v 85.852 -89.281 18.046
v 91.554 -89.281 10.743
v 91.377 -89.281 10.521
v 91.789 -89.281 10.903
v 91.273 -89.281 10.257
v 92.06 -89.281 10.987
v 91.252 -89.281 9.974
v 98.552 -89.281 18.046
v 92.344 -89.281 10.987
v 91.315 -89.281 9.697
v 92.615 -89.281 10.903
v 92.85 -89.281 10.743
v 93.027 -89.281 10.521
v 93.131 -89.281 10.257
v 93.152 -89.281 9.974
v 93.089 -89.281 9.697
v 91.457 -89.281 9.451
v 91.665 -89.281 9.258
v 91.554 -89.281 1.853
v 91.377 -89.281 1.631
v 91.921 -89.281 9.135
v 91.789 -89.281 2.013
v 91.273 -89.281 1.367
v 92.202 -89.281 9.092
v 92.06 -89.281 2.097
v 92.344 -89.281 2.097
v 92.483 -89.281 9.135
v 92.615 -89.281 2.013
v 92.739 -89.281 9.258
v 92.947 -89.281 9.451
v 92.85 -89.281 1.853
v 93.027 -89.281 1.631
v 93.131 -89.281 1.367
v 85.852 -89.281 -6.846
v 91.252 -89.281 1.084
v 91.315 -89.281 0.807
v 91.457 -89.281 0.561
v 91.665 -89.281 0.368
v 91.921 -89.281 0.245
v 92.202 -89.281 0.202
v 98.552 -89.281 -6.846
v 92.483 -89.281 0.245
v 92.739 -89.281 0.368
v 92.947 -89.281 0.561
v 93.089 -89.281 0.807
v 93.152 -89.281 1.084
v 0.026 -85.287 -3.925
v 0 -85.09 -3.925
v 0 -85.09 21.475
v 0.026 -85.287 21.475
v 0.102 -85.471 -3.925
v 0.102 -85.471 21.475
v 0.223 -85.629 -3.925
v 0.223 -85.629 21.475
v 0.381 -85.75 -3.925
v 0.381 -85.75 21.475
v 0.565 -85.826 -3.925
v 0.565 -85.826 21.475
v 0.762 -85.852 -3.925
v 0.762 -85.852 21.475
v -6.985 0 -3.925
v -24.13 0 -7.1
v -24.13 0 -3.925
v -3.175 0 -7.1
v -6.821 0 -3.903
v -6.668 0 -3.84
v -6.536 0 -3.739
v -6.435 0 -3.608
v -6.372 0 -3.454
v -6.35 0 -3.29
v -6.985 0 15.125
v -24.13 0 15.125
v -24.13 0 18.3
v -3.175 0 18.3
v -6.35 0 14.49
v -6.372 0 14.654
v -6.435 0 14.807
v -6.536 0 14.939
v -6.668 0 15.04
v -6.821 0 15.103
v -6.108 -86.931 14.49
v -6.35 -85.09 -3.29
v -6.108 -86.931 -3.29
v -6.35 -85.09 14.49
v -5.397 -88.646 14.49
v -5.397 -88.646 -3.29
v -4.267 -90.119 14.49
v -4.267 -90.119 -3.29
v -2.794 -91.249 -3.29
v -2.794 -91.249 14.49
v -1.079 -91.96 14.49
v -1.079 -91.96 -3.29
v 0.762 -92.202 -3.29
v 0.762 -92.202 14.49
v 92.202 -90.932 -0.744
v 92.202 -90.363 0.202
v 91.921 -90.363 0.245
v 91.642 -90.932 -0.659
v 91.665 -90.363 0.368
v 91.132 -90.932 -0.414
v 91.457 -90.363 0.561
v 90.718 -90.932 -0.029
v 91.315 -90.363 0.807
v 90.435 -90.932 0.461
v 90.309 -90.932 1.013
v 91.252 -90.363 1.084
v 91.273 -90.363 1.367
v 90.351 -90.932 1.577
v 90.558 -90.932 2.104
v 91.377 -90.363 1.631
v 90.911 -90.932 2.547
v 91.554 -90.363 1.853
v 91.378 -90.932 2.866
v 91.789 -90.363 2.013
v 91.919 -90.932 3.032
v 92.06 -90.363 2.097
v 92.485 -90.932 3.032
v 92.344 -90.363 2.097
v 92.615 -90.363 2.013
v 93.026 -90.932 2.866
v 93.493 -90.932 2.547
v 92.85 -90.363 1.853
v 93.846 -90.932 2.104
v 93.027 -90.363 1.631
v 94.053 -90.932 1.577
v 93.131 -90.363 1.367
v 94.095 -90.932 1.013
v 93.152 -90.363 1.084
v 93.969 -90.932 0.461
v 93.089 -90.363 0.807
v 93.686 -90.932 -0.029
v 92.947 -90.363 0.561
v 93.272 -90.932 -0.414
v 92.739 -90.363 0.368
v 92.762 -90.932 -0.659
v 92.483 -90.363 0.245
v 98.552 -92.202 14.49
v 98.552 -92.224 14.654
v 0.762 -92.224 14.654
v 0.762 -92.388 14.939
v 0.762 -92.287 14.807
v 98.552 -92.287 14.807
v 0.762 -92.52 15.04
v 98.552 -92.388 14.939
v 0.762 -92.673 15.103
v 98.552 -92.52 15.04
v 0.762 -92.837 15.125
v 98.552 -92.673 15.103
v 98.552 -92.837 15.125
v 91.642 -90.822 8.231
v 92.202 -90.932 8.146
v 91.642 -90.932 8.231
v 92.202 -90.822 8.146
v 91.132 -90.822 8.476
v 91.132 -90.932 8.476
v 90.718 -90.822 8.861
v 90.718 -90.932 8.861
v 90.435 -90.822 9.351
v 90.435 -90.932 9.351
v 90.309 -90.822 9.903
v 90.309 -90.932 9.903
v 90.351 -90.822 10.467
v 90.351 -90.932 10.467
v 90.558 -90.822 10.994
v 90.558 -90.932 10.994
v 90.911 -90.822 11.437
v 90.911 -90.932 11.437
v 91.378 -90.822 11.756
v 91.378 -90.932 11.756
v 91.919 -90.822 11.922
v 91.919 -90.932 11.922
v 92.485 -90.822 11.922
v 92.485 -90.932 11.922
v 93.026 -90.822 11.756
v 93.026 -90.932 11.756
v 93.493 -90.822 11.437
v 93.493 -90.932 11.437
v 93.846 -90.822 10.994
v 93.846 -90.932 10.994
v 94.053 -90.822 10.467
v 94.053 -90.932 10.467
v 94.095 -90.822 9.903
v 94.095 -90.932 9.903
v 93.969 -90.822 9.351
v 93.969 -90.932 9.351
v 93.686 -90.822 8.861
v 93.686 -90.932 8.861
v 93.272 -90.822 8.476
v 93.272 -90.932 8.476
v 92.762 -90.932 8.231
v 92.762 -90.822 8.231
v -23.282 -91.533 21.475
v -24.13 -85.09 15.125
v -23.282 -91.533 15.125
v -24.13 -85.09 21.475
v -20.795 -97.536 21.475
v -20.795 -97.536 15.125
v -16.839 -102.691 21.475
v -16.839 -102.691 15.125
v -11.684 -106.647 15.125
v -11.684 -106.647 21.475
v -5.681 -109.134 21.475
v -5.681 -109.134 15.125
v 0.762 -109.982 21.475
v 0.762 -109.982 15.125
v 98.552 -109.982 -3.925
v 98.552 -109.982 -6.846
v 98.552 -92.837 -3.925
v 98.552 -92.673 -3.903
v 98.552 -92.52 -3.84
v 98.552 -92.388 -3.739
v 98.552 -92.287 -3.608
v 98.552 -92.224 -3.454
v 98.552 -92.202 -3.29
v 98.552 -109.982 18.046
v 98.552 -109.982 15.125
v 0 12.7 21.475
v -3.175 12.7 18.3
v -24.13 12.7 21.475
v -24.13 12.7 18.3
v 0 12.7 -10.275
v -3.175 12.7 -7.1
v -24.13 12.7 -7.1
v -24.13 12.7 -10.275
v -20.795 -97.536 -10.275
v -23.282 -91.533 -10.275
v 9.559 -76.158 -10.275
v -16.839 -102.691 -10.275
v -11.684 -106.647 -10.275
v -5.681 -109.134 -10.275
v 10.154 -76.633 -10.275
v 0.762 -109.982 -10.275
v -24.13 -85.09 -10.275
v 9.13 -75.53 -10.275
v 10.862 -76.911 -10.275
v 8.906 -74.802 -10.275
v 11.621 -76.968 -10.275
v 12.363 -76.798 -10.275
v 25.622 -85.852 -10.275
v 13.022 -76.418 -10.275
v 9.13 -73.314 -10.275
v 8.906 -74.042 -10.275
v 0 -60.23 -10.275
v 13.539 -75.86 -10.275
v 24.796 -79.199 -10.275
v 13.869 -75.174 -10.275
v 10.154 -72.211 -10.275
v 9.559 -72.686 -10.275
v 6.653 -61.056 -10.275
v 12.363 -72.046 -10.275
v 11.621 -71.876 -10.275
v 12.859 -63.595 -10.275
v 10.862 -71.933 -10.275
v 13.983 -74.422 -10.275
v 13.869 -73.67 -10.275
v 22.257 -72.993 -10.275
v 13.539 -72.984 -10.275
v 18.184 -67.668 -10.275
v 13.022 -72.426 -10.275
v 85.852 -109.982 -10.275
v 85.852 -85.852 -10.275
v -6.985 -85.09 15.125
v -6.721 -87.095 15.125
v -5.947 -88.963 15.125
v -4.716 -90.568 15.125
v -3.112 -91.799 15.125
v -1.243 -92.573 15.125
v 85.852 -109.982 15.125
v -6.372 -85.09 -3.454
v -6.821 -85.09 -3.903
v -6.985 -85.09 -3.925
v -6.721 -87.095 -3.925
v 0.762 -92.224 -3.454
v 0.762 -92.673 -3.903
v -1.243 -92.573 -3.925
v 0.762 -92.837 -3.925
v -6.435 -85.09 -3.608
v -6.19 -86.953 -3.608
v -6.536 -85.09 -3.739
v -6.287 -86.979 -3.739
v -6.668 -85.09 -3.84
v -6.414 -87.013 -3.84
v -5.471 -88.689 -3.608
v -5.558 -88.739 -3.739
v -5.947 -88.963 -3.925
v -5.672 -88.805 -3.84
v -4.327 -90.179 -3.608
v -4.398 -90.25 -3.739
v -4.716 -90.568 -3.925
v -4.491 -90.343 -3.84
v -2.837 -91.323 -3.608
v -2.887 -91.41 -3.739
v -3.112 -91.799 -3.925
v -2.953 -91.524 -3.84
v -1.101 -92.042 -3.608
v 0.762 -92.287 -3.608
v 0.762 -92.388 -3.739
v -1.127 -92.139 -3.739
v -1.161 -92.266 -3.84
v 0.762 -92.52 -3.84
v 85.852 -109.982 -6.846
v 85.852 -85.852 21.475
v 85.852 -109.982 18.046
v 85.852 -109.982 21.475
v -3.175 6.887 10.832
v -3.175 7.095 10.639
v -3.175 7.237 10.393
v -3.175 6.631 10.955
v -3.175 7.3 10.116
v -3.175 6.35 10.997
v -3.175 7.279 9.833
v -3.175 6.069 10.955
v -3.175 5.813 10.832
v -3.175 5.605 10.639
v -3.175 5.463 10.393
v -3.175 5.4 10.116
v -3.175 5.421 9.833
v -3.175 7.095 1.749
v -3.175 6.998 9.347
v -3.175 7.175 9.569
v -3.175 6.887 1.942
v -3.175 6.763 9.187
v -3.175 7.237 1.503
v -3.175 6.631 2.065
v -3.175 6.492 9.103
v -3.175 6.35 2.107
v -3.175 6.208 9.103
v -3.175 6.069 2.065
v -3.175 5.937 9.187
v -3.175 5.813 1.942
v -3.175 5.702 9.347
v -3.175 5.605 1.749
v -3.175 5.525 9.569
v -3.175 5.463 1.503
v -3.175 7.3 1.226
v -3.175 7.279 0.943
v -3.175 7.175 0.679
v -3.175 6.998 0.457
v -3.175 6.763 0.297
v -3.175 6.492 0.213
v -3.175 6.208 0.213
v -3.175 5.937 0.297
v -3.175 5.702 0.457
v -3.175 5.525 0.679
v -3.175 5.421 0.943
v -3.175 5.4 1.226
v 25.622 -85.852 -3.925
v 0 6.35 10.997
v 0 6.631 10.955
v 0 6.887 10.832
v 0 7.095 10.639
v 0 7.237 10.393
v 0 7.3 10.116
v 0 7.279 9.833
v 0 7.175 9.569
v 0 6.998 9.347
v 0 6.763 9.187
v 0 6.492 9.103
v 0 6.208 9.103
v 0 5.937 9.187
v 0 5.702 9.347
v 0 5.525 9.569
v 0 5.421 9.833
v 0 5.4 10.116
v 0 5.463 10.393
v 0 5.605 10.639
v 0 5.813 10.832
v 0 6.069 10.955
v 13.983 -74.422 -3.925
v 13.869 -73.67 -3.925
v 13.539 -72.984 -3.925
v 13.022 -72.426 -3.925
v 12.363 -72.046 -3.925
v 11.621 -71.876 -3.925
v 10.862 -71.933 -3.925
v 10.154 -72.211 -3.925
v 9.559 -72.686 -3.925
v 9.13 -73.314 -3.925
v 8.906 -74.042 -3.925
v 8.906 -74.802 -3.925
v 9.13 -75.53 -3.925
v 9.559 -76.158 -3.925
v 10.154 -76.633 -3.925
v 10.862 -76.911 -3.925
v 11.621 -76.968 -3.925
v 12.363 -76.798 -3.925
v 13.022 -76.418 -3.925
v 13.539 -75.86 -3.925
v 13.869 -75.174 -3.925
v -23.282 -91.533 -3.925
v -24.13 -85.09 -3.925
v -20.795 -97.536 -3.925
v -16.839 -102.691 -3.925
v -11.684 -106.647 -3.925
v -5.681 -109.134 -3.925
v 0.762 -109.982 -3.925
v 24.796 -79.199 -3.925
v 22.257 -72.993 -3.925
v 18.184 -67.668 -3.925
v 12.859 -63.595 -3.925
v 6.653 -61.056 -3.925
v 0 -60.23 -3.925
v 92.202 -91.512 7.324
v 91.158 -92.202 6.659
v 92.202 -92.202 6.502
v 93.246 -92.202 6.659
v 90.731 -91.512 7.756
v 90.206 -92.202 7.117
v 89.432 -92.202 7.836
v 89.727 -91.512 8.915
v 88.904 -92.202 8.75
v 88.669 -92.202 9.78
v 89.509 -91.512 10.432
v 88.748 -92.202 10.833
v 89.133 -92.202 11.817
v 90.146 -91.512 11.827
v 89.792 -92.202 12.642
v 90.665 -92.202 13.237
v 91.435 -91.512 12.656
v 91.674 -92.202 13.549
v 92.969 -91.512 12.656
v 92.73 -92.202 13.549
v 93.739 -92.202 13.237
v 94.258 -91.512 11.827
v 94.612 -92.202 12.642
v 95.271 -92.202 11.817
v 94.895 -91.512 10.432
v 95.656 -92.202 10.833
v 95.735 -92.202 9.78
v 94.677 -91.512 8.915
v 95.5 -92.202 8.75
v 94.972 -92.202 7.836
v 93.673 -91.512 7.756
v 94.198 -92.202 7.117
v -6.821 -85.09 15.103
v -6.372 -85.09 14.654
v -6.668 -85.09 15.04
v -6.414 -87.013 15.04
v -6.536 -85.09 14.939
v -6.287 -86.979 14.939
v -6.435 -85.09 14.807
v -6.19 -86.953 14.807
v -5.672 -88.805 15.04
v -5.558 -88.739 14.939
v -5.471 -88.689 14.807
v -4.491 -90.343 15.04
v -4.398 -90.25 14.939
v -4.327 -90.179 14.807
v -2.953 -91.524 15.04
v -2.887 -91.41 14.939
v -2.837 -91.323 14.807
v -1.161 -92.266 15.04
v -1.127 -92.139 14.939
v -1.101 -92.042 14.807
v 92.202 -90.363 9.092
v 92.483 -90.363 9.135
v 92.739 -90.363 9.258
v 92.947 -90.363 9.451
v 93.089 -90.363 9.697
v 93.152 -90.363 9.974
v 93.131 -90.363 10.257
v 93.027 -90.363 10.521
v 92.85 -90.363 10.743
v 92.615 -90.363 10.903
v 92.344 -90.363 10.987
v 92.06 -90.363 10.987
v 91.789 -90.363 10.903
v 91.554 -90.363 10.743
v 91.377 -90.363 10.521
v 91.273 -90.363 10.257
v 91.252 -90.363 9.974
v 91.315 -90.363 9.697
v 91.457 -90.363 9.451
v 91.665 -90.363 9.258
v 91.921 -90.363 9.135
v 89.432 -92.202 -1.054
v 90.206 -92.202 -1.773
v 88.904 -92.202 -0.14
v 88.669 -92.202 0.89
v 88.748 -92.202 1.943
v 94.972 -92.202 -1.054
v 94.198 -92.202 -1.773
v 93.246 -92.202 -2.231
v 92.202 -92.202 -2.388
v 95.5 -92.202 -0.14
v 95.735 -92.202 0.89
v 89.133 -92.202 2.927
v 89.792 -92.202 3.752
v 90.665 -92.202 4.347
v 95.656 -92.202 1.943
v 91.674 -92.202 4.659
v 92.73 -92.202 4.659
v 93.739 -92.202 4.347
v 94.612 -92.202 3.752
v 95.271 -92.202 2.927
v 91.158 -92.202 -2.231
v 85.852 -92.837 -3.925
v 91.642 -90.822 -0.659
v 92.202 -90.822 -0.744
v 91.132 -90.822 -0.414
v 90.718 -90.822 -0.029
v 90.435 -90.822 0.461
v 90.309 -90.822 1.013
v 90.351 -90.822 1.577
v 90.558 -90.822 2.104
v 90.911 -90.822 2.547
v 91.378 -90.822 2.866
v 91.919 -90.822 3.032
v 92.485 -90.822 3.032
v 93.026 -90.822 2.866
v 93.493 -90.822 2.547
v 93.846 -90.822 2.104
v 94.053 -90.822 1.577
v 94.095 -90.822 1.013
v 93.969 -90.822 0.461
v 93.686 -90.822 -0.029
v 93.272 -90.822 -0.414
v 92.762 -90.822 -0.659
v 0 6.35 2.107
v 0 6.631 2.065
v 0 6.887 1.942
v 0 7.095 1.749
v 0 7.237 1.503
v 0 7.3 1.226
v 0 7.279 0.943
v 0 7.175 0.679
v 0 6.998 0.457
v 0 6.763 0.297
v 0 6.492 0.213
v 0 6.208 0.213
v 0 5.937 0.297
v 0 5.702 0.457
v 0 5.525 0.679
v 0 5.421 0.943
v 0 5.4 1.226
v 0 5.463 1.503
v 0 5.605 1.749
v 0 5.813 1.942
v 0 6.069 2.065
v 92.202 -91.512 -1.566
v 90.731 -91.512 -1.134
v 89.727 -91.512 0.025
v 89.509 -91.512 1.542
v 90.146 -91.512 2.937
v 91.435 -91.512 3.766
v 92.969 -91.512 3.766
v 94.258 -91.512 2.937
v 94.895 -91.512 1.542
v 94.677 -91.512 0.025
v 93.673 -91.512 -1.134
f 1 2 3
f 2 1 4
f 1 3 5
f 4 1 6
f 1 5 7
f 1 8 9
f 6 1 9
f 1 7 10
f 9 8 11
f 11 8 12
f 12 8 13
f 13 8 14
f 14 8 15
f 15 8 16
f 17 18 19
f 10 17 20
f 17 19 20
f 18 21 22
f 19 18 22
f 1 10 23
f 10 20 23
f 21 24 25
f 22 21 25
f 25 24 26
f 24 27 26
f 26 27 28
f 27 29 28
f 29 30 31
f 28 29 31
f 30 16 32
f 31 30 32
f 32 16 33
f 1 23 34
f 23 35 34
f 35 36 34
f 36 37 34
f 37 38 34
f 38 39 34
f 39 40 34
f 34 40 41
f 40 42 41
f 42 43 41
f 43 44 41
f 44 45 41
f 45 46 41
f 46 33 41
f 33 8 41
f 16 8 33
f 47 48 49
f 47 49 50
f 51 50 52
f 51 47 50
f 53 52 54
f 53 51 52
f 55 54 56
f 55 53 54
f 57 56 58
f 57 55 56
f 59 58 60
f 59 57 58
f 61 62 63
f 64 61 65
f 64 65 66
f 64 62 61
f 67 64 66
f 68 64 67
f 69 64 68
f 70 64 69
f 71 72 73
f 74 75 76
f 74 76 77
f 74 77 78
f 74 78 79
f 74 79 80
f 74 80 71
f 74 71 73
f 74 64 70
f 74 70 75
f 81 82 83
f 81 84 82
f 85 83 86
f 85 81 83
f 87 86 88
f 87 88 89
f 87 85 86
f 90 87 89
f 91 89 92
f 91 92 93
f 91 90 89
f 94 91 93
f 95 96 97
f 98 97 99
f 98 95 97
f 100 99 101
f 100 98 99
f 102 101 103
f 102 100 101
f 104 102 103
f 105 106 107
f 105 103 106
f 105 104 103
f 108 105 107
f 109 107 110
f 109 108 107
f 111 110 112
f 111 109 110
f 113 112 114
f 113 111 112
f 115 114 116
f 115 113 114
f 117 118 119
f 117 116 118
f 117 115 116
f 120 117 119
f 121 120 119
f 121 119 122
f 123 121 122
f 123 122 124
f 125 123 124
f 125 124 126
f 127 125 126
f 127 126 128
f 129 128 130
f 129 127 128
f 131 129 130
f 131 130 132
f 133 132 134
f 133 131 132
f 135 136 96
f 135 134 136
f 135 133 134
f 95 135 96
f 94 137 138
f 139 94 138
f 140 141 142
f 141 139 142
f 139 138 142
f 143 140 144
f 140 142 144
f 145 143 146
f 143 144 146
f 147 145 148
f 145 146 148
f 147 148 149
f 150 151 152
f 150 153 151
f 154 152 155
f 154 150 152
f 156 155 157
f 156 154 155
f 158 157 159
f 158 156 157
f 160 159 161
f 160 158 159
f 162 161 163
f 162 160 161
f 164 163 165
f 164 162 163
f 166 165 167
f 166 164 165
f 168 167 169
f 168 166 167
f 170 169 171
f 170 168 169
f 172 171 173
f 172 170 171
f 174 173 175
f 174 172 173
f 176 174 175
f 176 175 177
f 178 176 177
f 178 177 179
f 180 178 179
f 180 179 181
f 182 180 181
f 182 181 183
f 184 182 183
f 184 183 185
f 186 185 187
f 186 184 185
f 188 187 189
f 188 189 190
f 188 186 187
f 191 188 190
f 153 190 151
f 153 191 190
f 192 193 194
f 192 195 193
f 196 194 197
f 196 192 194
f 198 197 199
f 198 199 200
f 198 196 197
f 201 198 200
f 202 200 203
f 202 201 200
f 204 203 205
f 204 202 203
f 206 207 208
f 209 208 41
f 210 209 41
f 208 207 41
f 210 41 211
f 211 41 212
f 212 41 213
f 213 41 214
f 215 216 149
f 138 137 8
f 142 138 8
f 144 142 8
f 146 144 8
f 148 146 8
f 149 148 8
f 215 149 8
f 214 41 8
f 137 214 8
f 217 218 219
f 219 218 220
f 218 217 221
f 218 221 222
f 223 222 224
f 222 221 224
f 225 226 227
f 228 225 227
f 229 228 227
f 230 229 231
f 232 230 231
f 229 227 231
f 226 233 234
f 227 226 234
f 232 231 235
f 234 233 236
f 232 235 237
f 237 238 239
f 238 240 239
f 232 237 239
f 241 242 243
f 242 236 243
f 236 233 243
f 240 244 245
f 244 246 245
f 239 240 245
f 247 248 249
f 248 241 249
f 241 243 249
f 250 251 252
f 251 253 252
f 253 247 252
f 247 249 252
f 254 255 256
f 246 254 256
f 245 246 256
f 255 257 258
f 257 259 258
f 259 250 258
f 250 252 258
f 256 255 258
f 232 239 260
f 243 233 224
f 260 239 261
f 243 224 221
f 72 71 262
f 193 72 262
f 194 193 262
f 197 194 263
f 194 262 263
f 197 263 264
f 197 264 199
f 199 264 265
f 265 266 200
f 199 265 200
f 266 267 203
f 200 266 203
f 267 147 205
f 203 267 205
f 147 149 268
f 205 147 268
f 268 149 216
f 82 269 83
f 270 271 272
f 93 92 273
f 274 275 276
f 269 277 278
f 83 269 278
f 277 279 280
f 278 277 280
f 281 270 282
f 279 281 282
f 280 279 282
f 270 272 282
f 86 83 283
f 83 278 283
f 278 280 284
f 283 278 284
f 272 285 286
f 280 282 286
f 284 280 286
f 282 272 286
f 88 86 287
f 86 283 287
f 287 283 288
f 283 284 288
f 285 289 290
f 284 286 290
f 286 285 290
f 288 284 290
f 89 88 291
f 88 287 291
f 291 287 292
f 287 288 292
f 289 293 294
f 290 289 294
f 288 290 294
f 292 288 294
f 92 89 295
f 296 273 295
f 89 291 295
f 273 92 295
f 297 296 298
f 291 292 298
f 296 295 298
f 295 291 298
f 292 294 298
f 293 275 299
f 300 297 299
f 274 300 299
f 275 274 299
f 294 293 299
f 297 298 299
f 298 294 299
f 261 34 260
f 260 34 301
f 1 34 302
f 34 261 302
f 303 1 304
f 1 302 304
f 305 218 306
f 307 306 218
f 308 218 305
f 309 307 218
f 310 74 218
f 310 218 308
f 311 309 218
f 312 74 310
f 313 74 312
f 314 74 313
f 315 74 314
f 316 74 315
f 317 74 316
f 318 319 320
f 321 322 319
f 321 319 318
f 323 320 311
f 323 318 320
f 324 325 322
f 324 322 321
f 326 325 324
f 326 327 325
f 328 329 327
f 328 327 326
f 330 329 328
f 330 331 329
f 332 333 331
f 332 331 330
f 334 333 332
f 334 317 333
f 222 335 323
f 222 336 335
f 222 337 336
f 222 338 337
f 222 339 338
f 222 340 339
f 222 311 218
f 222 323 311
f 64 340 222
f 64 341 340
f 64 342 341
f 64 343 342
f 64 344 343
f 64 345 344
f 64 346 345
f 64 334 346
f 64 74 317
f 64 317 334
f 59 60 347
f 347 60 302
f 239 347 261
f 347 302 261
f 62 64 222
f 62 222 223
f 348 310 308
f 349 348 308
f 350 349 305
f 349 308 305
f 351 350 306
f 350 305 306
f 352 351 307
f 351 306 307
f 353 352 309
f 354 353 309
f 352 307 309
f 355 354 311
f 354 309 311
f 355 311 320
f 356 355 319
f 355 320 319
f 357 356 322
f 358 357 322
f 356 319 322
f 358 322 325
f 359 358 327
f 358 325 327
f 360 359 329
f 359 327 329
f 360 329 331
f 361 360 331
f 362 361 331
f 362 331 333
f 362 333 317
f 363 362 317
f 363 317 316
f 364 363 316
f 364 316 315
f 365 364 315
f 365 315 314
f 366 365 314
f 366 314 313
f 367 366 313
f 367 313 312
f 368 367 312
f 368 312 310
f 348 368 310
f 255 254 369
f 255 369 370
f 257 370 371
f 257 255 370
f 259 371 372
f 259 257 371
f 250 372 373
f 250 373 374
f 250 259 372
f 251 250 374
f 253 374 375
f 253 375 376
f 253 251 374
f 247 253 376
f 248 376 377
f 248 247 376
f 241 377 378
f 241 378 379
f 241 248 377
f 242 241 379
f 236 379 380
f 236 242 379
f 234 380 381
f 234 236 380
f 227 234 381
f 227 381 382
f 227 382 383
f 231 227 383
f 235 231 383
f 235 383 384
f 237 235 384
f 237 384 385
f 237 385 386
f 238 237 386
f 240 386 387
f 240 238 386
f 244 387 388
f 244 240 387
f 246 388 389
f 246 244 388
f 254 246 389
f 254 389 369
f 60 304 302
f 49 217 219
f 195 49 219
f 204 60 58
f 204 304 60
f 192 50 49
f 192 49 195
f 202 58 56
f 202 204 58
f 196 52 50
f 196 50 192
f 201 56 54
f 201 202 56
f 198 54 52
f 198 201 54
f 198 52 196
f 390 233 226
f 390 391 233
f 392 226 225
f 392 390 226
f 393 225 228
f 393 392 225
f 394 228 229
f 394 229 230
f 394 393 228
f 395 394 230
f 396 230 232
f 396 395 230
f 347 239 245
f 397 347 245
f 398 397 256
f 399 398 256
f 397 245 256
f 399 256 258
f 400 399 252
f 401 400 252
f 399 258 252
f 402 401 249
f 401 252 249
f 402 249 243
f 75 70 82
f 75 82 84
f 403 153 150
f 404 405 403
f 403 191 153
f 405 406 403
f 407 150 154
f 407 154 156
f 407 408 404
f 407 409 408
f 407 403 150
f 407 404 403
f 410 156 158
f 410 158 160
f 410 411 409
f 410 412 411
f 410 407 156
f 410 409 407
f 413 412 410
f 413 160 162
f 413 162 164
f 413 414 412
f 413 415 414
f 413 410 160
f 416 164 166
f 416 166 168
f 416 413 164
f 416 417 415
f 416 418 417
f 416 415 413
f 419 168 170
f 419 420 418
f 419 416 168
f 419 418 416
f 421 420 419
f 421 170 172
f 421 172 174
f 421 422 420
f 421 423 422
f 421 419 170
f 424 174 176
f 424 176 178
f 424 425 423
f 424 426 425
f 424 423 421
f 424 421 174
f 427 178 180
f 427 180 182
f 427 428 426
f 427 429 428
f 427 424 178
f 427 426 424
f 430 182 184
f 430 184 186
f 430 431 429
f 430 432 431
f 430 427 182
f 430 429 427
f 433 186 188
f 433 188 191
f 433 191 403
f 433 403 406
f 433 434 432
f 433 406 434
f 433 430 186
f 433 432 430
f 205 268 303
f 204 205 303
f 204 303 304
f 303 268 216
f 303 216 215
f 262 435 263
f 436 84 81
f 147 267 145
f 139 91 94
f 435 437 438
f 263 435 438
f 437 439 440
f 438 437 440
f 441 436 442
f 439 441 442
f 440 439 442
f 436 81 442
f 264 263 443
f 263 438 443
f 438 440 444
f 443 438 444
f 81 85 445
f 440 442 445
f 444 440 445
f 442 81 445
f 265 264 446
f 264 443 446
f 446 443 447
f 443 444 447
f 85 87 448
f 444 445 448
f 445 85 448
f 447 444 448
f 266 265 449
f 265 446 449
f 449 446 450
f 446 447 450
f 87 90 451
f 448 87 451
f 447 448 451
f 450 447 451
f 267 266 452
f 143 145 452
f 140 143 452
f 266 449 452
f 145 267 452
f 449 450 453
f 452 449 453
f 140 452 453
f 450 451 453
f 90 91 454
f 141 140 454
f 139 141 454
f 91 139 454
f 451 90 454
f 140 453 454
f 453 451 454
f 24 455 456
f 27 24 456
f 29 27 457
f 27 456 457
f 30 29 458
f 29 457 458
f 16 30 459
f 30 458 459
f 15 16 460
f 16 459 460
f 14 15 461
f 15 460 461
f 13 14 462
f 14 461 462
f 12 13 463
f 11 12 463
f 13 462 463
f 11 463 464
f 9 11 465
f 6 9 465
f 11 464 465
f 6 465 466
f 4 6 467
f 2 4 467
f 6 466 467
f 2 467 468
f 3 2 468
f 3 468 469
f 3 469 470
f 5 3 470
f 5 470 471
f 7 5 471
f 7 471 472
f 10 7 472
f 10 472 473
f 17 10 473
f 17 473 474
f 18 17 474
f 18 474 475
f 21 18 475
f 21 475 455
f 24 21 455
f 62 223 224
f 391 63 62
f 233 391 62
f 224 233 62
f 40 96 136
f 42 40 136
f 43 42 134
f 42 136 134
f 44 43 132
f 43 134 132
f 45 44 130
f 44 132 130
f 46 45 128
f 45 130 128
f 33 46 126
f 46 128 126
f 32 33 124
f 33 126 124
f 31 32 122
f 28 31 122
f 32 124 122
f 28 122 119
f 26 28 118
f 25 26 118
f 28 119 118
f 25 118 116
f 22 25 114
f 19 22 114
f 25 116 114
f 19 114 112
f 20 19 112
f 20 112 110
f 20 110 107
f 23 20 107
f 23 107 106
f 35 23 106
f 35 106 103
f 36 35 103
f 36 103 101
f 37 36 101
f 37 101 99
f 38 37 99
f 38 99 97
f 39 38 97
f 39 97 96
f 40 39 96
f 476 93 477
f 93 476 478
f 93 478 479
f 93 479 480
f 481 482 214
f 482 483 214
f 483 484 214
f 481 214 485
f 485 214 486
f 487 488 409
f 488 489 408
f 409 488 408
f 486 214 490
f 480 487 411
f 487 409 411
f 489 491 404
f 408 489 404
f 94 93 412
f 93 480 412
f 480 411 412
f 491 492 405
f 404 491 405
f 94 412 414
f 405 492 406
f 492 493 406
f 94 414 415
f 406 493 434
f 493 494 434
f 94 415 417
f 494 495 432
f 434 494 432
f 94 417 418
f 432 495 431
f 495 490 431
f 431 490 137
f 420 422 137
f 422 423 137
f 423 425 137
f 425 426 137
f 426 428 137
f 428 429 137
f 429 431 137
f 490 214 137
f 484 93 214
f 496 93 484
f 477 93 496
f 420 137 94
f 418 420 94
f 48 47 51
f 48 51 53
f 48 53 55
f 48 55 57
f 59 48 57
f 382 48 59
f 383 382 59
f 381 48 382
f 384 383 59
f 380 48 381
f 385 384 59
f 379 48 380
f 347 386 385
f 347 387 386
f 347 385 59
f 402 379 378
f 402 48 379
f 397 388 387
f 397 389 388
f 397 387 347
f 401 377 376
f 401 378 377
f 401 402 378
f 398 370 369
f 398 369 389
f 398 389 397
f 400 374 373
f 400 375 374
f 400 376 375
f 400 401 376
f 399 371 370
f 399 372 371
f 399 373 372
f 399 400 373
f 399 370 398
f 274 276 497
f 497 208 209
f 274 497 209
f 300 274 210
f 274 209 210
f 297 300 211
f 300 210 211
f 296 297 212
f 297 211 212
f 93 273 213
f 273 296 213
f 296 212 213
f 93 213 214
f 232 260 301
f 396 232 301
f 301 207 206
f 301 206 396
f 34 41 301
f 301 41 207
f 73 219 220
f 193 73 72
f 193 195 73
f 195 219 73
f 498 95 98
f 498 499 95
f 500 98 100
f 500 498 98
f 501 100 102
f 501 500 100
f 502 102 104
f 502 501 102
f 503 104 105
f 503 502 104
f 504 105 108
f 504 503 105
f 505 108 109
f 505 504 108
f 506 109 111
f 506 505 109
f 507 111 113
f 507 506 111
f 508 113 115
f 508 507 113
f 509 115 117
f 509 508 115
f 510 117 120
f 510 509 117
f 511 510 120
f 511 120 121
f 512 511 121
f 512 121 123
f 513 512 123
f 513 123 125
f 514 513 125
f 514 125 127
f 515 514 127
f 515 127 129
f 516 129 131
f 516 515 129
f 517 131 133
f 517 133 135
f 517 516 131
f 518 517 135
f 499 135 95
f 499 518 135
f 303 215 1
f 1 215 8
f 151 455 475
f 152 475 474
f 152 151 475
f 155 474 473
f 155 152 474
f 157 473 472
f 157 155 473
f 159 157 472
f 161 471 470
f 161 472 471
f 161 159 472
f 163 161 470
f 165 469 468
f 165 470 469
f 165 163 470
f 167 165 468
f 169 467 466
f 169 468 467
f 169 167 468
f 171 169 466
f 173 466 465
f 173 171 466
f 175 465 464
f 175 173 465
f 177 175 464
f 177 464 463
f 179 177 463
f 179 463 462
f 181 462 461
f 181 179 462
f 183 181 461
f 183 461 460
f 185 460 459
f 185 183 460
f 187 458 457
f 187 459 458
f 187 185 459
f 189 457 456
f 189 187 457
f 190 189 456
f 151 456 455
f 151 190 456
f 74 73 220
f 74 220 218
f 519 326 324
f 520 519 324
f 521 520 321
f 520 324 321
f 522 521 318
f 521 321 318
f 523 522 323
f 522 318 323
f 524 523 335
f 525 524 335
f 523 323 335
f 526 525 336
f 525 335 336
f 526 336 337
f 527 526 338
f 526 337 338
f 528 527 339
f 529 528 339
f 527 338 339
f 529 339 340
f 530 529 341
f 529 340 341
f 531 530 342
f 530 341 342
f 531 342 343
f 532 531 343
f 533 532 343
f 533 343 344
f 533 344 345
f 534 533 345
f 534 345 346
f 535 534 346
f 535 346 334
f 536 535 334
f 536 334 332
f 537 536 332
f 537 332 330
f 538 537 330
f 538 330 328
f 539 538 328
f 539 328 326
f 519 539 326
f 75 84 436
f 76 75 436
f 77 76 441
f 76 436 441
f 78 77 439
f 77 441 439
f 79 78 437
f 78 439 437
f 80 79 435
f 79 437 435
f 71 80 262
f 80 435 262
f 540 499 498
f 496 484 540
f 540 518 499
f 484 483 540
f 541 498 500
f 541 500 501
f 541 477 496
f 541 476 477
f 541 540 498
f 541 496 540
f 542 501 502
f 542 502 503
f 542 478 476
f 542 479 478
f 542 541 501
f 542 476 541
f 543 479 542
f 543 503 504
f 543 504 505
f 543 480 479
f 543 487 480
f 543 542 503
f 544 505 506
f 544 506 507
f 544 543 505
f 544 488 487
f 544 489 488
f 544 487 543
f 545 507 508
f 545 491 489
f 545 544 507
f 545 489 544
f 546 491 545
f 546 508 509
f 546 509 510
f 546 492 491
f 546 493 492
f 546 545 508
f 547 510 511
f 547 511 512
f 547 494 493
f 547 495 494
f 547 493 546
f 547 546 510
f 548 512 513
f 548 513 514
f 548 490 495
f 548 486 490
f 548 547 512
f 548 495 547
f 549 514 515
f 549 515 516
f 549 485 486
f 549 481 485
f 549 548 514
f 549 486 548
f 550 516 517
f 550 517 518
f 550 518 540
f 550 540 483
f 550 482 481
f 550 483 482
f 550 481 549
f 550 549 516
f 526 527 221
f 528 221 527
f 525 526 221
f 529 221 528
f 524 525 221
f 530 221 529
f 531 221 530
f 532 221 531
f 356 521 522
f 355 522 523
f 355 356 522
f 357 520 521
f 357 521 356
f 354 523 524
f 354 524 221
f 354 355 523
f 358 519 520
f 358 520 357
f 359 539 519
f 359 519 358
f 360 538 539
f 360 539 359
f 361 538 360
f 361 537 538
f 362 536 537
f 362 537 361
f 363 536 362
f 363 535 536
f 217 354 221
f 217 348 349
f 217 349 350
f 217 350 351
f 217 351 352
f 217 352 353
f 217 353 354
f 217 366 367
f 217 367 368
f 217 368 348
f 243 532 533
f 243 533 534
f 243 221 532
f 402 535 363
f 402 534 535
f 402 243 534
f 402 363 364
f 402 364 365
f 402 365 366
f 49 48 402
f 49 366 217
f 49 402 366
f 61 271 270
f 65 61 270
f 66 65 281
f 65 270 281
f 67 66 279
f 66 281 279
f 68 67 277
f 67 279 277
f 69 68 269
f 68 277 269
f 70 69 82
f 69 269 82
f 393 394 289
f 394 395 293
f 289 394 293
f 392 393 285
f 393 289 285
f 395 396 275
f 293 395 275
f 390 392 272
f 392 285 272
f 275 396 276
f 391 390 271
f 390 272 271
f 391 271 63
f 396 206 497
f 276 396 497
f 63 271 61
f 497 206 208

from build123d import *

# Parameters (mm, degrees)
BOSS_EXTRUDE2_START  = 12.7
BOSS_EXTRUDE2_DEPTH  = 12.7
BOSS_EXTRUDE3_DEPTH  = 12.7
SKETCH8_R            = 0.9525
CUT_EXTRUDE1_DEPTH   = 146.526980066
SKETCH9_R            = 0.9525
CUT_EXTRUDE2_DEPTH   = 152.345956246
SKETCH12_R           = 2.5527
BOSS_EXTRUDE10_DEPTH = 6.35


with BuildPart() as part:
    # Sweep1: sweep along a path in Sketch4
    with BuildLine(Plane.XY) as sweep1_path:
        Line((0, 0), (0, -85.09))
        ThreePointArc((0, -85.09), (0.223184633, -85.628815367), (0.762, -85.852))
        Line((0.762, -85.852), (85.852, -85.852))
    # Sketch3 → Sweep1 (sweep)
    with BuildSketch(Plane(origin=(0, 0, 0), x_dir=(1, 0, 0), z_dir=(0, 1, 0))):
        with BuildLine():
            Line((0, 10.27500014), (-24.13, 10.27500014))
            Line((-24.13, 10.27500014), (-24.13, 3.92500014))
            Line((-24.13, 3.92500014), (-6.985, 3.92500014))
            ThreePointArc((-6.985, 3.92500014), (-6.535987194, 3.739012946), (-6.35, 3.29000014))
            Line((-6.35, 3.29000014), (-6.35, -14.48999986))
            ThreePointArc((-6.35, -14.48999986), (-6.535987194, -14.939012666), (-6.985, -15.12499986))
            Line((-6.985, -15.12499986), (-24.13, -15.12499986))
            Line((-24.13, -15.12499986), (-24.13, -21.47499986))
            Line((-24.13, -21.47499986), (0, -21.47499986))
            Line((0, -21.47499986), (0, 10.27500014))
        make_face()
    sweep(path=sweep1_path.line)

    # Sketch6 → Boss-Extrude2 (add)
    with BuildSketch(Plane(origin=(85.852, 0, 0), x_dir=(0, 0, -1), z_dir=(1, 0, 0)).offset(BOSS_EXTRUDE2_START)):
        with BuildLine():
            Line((-18.04599986, -89.281), (6.84600014, -89.281))
            Line((6.84600014, -89.281), (6.84600014, -109.982))
            Line((6.84600014, -109.982), (3.92500014, -109.982))
            Line((3.92500014, -109.982), (3.92500014, -92.837))
            ThreePointArc((3.92500014, -92.837), (3.739012946, -92.387987194), (3.29000014, -92.202))
            Line((3.29000014, -92.202), (-14.48999986, -92.202))
            ThreePointArc((-14.48999986, -92.202), (-14.939012666, -92.387987194), (-15.12499986, -92.837))
            Line((-15.12499986, -92.837), (-15.12499986, -109.982))
            Line((-15.12499986, -109.982), (-18.04599986, -109.982))
            Line((-18.04599986, -109.982), (-18.04599986, -89.281))
        make_face()
    extrude(amount=-BOSS_EXTRUDE2_DEPTH)

    # Sketch7 → Boss-Extrude3 (add)
    with BuildSketch(Plane(origin=(0, 0, 0), x_dir=(1, 0, 0), z_dir=(0, 1, 0))):
        Polygon((-24.13, 7.10000014), (-24.13, 10.27500014), (0, 10.27500014), (0, -21.47499986), (-24.13, -21.47499986), (-24.13, -18.29999986), (-3.175, -18.29999986), (-3.175, 7.10000014), align=None)
    extrude(amount=BOSS_EXTRUDE3_DEPTH)

    # Sketch8 → Cut-Extrude1 (cut, through all)
    with BuildSketch(Plane.XZ.offset(92.202)):
        with Locations(Location((92.202, 10.04499986, 0), (0, 0, 270))):
            Circle(SKETCH8_R)
        with Locations(Location((92.202, 1.15499986, 0), (0, 0, 270))):
            Circle(SKETCH8_R)
    extrude(amount=-CUT_EXTRUDE1_DEPTH, mode=Mode.SUBTRACT)

    # Sketch9 → Cut-Extrude2 (cut, through all)
    with BuildSketch(Plane.ZY.offset(3.175)):
        with Locations((1.15499986, 6.35)):
            Circle(SKETCH9_R)
        with Locations((10.04499986, 6.35)):
            Circle(SKETCH9_R)
    extrude(amount=-CUT_EXTRUDE2_DEPTH, mode=Mode.SUBTRACT)

    # Sketch12 → Boss-Extrude10 (add)
    with BuildSketch(Plane.XY.offset(-10.27500014)):
        with BuildLine():
            Line((0, -60.229795925), (0, -85.09))
            ThreePointArc((0, -85.09), (0.223184633, -85.628815367), (0.762, -85.852))
            Line((0.762, -85.852), (25.622204075, -85.852))
            ThreePointArc((25.622204075, -85.852), (18.183696875, -67.668303125), (0, -60.229795925))
        make_face()
        with Locations((11.43, -74.422)):
            Circle(SKETCH12_R, mode=Mode.SUBTRACT)
    extrude(amount=BOSS_EXTRUDE10_DEPTH)

    # Sketch14 → CSK for _6 Flat Head Machine Screw _100 (revolve, cut)
    with BuildSketch(Plane(origin=(92.202, -92.202, 1.15499986), x_dir=(0, 0, -1), z_dir=(1, 0, 0))):
        Polygon((0, 0), (0, 2.410824014), (1.89865, 1.27), (1.89865, 1.380025208), (3.5433, 0), align=None)
    revolve(axis=Axis((92.202, -98.552, 1.15499986), (0, 1, 0)), mode=Mode.SUBTRACT)

    # Sketch16 → CSK for _6 Flat Head Machine Screw _ 2 (revolve, cut)
    with BuildSketch(Plane(origin=(92.202, -92.202, 10.04499986), x_dir=(0, 0, -1), z_dir=(1, 0, 0))):
        Polygon((0, 0), (0, 2.410824014), (1.89865, 1.27), (1.89865, 1.380025208), (3.5433, 0), align=None)
    revolve(axis=Axis((92.202, -98.552, 10.04499986), (0, 1, 0)), mode=Mode.SUBTRACT)


solid = part.part
